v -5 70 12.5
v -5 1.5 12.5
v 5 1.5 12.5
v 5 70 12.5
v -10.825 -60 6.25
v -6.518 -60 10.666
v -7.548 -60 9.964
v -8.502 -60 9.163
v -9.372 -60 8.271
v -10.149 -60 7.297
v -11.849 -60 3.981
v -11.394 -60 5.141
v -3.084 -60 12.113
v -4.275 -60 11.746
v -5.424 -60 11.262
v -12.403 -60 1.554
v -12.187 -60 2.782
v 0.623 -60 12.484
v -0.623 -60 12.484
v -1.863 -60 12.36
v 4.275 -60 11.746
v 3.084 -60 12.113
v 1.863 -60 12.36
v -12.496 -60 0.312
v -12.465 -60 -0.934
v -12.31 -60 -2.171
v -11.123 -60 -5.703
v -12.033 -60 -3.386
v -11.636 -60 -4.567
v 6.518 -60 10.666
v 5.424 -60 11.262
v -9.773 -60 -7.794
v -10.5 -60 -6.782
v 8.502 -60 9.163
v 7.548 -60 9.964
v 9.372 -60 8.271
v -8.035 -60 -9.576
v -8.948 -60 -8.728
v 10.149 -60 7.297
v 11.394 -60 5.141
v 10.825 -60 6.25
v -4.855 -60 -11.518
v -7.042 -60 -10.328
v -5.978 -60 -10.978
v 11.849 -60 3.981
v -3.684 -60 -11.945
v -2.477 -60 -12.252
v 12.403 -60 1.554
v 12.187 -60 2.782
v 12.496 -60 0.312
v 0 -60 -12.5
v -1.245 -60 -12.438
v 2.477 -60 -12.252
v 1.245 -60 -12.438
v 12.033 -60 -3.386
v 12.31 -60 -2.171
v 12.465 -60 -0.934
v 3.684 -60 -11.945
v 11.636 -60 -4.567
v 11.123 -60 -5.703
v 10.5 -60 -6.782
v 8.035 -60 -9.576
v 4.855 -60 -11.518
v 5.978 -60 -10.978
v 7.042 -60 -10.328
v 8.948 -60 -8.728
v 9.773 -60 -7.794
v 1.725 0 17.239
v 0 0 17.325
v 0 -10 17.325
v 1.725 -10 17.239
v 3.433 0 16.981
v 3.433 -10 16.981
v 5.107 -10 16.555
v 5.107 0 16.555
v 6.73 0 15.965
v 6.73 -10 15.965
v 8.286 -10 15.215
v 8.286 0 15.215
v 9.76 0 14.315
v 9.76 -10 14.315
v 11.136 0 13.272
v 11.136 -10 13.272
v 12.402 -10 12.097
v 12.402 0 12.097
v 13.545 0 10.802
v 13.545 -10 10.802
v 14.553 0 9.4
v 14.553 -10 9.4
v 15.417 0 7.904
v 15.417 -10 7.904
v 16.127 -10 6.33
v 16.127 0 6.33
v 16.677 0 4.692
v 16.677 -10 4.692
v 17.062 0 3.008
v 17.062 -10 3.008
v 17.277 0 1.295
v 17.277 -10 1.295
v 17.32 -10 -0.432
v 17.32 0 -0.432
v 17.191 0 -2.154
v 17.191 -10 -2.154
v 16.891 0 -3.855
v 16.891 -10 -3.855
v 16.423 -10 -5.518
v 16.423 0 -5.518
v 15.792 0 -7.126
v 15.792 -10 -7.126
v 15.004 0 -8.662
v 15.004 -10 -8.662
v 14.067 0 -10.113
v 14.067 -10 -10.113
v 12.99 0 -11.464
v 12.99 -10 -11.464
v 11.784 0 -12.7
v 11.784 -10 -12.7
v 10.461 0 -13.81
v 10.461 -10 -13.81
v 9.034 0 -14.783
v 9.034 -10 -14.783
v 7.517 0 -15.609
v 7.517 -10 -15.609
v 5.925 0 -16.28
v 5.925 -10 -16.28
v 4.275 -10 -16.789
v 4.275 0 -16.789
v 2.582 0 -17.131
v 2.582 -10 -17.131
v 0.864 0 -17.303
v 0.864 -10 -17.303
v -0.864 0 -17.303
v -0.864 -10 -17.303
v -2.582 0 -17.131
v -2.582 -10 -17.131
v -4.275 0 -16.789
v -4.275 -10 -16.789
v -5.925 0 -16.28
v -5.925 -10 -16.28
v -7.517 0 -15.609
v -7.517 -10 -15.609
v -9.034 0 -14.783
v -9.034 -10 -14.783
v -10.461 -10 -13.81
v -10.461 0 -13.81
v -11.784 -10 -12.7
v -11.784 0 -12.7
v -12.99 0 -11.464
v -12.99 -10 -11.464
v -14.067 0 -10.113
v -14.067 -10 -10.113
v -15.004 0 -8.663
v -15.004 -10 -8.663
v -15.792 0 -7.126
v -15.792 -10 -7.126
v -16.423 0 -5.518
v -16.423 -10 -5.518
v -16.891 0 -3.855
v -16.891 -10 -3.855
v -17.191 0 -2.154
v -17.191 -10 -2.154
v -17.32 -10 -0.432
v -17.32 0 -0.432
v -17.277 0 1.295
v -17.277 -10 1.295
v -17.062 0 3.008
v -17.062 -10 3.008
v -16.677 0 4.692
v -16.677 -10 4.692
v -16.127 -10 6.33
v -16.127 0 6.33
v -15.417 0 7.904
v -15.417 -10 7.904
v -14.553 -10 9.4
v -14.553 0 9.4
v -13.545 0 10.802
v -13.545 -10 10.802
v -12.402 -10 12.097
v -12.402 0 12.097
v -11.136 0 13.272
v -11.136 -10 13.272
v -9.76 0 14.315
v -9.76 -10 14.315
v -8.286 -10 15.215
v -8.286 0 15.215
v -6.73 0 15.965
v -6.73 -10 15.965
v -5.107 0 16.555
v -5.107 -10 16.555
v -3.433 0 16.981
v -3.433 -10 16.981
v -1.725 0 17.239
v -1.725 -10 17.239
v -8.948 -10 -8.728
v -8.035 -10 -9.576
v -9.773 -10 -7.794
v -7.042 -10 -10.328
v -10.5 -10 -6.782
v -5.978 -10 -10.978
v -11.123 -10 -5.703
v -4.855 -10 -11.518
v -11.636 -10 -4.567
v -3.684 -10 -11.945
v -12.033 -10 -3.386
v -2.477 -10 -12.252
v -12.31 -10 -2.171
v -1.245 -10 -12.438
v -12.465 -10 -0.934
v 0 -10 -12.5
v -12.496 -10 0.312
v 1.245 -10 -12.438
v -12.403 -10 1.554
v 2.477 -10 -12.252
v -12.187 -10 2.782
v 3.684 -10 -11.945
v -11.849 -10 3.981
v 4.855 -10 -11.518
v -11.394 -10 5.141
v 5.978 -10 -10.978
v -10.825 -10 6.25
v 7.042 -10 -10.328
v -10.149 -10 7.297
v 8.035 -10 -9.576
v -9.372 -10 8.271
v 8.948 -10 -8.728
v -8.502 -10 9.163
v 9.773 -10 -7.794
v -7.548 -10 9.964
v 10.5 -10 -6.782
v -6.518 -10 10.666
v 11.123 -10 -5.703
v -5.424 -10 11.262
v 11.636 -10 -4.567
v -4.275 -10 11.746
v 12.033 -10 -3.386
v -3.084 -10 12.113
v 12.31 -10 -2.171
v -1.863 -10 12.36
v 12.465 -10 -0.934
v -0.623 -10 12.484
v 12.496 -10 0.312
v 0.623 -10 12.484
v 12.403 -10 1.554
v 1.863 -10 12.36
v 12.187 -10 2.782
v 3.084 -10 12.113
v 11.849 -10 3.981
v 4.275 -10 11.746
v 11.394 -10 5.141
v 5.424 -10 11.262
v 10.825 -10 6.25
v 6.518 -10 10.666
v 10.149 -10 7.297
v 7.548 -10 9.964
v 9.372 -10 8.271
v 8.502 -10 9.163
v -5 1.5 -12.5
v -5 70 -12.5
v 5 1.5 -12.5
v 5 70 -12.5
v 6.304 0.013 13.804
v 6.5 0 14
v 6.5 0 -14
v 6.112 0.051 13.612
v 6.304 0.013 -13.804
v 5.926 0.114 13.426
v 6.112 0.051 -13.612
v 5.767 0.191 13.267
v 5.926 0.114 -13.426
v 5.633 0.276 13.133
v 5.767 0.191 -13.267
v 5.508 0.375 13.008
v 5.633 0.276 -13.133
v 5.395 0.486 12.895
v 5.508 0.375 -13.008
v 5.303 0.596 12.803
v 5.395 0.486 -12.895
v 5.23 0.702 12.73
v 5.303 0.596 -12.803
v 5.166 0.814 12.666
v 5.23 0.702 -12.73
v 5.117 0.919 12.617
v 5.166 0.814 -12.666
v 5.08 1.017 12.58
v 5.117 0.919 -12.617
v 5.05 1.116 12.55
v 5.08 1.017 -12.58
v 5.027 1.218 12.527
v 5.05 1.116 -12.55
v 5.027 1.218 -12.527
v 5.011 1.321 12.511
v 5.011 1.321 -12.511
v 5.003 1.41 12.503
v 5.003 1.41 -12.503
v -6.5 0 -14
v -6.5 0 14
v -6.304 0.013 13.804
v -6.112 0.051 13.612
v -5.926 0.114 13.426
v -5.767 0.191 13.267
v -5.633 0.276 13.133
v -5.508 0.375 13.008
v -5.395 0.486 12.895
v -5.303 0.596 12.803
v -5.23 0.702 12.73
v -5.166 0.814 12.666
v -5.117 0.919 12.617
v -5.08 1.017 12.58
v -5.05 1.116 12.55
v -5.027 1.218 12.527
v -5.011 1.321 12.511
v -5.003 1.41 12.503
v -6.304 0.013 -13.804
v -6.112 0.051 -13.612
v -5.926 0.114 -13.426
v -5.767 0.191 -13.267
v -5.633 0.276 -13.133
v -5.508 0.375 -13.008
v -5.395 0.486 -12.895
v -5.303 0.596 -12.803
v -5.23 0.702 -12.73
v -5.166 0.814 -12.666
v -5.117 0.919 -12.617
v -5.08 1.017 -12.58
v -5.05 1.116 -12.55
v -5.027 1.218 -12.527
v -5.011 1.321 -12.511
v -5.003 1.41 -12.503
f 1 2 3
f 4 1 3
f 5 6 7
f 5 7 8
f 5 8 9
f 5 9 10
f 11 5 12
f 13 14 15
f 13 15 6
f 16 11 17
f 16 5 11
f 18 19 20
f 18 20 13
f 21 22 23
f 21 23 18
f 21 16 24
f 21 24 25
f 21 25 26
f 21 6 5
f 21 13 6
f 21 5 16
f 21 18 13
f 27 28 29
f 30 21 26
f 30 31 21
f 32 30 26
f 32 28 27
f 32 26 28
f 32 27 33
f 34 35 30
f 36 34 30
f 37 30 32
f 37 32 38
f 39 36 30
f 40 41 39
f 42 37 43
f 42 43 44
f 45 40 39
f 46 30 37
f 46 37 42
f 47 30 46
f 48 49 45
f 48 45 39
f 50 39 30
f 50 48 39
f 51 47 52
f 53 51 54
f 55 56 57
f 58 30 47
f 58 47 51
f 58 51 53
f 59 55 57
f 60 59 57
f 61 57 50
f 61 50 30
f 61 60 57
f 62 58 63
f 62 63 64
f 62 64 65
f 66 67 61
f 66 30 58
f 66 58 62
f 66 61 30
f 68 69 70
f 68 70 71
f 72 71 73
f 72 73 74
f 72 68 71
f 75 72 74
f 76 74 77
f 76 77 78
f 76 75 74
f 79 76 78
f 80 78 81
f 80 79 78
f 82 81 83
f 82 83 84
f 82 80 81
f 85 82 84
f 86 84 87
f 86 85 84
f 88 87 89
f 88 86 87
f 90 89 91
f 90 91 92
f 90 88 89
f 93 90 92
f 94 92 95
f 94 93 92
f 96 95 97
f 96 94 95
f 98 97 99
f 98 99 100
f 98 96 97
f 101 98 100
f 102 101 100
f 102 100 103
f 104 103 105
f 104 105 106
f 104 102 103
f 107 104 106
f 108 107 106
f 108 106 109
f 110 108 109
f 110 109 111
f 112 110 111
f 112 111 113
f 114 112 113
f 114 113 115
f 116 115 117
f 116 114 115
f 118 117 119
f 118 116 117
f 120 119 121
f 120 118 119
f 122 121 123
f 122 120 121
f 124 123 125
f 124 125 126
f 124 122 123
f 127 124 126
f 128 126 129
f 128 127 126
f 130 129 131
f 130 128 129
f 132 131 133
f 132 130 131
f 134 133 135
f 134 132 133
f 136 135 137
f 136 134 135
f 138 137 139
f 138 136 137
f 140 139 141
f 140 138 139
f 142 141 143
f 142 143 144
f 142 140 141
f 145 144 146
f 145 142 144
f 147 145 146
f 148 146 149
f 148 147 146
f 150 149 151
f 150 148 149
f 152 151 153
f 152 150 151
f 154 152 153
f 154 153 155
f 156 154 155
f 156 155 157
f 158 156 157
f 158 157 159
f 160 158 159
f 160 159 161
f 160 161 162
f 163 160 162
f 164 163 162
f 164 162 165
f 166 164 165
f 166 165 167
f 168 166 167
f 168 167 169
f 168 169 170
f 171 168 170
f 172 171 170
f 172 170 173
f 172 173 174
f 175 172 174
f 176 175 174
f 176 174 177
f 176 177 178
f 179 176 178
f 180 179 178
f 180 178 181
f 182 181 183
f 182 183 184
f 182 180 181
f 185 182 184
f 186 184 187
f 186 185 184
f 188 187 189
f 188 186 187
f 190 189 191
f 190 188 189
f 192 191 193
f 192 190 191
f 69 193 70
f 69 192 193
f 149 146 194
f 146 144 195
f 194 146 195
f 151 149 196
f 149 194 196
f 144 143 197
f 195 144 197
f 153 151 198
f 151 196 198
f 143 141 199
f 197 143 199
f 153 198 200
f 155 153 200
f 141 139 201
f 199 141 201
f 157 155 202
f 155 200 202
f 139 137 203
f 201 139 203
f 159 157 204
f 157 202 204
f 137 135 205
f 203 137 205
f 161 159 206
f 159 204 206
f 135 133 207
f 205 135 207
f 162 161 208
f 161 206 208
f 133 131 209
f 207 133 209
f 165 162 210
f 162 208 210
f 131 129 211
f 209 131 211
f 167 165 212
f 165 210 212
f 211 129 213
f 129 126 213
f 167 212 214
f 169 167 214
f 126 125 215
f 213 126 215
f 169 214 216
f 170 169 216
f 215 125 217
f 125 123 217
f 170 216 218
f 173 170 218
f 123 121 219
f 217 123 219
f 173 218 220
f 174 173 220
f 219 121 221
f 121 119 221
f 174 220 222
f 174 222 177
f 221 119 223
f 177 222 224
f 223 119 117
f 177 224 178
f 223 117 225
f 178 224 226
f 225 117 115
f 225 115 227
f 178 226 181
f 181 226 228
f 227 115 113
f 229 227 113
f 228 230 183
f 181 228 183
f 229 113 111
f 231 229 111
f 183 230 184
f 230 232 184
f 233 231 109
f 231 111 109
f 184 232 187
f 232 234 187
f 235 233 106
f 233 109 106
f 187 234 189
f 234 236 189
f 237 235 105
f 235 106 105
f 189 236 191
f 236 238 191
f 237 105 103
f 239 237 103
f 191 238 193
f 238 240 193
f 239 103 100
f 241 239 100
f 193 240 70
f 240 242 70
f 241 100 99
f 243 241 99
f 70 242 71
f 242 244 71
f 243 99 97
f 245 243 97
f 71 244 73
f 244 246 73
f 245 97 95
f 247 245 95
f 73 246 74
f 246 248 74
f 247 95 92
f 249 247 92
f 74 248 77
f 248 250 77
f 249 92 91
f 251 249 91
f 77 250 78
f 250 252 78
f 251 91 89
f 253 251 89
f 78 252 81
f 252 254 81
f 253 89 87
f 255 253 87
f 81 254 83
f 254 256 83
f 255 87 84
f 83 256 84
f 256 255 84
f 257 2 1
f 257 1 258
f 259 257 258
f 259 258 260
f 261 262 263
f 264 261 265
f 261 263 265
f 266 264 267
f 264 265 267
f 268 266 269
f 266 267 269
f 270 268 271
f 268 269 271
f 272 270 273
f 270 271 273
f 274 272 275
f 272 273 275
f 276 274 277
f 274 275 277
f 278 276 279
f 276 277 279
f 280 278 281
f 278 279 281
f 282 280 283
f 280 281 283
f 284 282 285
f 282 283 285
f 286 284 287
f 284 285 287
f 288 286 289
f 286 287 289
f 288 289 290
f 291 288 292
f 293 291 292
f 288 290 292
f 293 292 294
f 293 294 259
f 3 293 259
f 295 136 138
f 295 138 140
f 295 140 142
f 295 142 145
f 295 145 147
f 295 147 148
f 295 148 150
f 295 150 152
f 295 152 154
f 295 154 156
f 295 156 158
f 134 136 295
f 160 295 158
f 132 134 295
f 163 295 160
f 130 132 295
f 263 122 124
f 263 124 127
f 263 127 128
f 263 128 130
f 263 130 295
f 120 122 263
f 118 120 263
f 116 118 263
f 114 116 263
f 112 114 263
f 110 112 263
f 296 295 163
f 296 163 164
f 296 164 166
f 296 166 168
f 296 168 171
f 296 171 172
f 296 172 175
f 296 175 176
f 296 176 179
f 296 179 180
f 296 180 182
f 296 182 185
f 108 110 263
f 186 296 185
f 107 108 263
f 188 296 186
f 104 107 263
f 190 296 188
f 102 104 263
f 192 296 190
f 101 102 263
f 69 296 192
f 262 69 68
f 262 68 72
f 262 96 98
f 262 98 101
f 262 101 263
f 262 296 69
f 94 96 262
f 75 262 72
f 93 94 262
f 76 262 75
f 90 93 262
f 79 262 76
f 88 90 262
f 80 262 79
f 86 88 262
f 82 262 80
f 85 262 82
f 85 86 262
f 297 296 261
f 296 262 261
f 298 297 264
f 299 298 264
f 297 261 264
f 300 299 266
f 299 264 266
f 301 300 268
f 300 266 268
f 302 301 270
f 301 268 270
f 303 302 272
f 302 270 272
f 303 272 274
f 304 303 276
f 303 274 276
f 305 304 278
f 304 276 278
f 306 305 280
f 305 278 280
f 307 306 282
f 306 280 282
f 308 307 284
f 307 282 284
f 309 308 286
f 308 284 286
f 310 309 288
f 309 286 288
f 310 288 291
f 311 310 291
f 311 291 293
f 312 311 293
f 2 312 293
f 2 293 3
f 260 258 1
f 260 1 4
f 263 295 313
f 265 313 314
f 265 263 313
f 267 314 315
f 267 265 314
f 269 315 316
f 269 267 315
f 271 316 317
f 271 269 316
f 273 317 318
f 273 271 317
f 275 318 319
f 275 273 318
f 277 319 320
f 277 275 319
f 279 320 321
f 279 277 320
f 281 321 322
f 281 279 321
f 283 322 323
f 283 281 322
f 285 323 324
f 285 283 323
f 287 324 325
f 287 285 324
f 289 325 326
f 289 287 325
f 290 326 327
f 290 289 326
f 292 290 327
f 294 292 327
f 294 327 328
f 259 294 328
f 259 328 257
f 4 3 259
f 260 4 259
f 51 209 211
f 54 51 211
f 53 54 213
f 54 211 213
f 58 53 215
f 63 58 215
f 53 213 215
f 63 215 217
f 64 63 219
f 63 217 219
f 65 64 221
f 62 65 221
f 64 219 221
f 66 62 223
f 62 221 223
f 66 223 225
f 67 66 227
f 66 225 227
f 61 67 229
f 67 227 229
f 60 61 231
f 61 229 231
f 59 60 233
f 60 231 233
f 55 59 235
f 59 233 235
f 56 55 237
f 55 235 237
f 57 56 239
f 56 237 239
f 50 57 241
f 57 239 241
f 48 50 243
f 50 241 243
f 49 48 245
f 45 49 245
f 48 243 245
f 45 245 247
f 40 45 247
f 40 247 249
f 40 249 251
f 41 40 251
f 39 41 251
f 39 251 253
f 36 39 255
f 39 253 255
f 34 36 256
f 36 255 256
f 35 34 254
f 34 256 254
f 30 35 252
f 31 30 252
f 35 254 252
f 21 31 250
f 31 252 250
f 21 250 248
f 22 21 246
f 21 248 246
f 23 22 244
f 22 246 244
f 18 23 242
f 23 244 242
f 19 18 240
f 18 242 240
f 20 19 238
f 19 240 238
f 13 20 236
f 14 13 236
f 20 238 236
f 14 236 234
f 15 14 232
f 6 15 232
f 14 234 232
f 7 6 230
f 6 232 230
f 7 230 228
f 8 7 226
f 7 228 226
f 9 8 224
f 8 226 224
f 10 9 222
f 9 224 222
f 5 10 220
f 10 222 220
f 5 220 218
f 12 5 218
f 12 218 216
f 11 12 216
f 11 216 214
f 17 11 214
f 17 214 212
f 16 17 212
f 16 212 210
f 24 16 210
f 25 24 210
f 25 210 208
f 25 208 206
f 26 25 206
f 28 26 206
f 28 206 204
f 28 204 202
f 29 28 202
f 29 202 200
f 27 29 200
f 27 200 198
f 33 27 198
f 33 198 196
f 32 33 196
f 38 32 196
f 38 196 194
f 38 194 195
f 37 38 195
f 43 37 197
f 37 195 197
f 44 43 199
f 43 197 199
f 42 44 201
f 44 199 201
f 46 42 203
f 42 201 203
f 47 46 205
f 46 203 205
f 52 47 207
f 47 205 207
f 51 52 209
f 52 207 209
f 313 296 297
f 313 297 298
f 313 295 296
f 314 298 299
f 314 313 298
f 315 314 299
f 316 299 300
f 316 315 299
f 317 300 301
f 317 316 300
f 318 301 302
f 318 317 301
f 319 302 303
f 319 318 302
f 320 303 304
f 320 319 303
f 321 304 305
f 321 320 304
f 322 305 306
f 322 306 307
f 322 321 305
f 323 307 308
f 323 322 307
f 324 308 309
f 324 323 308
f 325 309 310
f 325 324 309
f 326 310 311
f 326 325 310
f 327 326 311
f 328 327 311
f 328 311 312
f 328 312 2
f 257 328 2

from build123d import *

# Parameters (mm, degrees)
SKETCH1_R           = 17.325
BOSS_EXTRUDE1_DEPTH = 10
SKETCH2_R           = 12.5
BOSS_EXTRUDE2_DEPTH = 50
SKETCH3_W           = 10
SKETCH3_H           = 25
BOSS_EXTRUDE3_DEPTH = 70
FILLET1_R           = 1.5


with BuildPart() as part:
    # Sketch1 → Boss-Extrude1 (new body)
    with BuildSketch(Plane(origin=(0, 0, 0), x_dir=(1, 0, 0), z_dir=(0, 1, 0))):
        with Locations(Location((0, 0, 0), (0, 0, 270))):
            Circle(SKETCH1_R)
    extrude(amount=-BOSS_EXTRUDE1_DEPTH)

    # Sketch2 → Boss-Extrude2 (add)
    with BuildSketch(Plane.XZ.offset(10)):
        with Locations(Location((0, 0, 0), (0, 0, 270))):
            Circle(SKETCH2_R)
    extrude(amount=BOSS_EXTRUDE2_DEPTH)

    # Sketch3 → Boss-Extrude3 (add)
    with BuildSketch(Plane(origin=(0, 0, 0), x_dir=(1, 0, 0), z_dir=(0, 1, 0))):
        Rectangle(SKETCH3_W, SKETCH3_H)
    extrude(amount=BOSS_EXTRUDE3_DEPTH)

    # Fillet1
    fillet1_edges = [part.edges().sort_by_distance(p)[0] for p in [
        (5, 0, 0),
        (0, 0, -12.5),
        (-5, 0, 0),
        (0, 0, 12.5),
    ]]
    fillet(fillet1_edges, radius=FILLET1_R)


solid = part.part
